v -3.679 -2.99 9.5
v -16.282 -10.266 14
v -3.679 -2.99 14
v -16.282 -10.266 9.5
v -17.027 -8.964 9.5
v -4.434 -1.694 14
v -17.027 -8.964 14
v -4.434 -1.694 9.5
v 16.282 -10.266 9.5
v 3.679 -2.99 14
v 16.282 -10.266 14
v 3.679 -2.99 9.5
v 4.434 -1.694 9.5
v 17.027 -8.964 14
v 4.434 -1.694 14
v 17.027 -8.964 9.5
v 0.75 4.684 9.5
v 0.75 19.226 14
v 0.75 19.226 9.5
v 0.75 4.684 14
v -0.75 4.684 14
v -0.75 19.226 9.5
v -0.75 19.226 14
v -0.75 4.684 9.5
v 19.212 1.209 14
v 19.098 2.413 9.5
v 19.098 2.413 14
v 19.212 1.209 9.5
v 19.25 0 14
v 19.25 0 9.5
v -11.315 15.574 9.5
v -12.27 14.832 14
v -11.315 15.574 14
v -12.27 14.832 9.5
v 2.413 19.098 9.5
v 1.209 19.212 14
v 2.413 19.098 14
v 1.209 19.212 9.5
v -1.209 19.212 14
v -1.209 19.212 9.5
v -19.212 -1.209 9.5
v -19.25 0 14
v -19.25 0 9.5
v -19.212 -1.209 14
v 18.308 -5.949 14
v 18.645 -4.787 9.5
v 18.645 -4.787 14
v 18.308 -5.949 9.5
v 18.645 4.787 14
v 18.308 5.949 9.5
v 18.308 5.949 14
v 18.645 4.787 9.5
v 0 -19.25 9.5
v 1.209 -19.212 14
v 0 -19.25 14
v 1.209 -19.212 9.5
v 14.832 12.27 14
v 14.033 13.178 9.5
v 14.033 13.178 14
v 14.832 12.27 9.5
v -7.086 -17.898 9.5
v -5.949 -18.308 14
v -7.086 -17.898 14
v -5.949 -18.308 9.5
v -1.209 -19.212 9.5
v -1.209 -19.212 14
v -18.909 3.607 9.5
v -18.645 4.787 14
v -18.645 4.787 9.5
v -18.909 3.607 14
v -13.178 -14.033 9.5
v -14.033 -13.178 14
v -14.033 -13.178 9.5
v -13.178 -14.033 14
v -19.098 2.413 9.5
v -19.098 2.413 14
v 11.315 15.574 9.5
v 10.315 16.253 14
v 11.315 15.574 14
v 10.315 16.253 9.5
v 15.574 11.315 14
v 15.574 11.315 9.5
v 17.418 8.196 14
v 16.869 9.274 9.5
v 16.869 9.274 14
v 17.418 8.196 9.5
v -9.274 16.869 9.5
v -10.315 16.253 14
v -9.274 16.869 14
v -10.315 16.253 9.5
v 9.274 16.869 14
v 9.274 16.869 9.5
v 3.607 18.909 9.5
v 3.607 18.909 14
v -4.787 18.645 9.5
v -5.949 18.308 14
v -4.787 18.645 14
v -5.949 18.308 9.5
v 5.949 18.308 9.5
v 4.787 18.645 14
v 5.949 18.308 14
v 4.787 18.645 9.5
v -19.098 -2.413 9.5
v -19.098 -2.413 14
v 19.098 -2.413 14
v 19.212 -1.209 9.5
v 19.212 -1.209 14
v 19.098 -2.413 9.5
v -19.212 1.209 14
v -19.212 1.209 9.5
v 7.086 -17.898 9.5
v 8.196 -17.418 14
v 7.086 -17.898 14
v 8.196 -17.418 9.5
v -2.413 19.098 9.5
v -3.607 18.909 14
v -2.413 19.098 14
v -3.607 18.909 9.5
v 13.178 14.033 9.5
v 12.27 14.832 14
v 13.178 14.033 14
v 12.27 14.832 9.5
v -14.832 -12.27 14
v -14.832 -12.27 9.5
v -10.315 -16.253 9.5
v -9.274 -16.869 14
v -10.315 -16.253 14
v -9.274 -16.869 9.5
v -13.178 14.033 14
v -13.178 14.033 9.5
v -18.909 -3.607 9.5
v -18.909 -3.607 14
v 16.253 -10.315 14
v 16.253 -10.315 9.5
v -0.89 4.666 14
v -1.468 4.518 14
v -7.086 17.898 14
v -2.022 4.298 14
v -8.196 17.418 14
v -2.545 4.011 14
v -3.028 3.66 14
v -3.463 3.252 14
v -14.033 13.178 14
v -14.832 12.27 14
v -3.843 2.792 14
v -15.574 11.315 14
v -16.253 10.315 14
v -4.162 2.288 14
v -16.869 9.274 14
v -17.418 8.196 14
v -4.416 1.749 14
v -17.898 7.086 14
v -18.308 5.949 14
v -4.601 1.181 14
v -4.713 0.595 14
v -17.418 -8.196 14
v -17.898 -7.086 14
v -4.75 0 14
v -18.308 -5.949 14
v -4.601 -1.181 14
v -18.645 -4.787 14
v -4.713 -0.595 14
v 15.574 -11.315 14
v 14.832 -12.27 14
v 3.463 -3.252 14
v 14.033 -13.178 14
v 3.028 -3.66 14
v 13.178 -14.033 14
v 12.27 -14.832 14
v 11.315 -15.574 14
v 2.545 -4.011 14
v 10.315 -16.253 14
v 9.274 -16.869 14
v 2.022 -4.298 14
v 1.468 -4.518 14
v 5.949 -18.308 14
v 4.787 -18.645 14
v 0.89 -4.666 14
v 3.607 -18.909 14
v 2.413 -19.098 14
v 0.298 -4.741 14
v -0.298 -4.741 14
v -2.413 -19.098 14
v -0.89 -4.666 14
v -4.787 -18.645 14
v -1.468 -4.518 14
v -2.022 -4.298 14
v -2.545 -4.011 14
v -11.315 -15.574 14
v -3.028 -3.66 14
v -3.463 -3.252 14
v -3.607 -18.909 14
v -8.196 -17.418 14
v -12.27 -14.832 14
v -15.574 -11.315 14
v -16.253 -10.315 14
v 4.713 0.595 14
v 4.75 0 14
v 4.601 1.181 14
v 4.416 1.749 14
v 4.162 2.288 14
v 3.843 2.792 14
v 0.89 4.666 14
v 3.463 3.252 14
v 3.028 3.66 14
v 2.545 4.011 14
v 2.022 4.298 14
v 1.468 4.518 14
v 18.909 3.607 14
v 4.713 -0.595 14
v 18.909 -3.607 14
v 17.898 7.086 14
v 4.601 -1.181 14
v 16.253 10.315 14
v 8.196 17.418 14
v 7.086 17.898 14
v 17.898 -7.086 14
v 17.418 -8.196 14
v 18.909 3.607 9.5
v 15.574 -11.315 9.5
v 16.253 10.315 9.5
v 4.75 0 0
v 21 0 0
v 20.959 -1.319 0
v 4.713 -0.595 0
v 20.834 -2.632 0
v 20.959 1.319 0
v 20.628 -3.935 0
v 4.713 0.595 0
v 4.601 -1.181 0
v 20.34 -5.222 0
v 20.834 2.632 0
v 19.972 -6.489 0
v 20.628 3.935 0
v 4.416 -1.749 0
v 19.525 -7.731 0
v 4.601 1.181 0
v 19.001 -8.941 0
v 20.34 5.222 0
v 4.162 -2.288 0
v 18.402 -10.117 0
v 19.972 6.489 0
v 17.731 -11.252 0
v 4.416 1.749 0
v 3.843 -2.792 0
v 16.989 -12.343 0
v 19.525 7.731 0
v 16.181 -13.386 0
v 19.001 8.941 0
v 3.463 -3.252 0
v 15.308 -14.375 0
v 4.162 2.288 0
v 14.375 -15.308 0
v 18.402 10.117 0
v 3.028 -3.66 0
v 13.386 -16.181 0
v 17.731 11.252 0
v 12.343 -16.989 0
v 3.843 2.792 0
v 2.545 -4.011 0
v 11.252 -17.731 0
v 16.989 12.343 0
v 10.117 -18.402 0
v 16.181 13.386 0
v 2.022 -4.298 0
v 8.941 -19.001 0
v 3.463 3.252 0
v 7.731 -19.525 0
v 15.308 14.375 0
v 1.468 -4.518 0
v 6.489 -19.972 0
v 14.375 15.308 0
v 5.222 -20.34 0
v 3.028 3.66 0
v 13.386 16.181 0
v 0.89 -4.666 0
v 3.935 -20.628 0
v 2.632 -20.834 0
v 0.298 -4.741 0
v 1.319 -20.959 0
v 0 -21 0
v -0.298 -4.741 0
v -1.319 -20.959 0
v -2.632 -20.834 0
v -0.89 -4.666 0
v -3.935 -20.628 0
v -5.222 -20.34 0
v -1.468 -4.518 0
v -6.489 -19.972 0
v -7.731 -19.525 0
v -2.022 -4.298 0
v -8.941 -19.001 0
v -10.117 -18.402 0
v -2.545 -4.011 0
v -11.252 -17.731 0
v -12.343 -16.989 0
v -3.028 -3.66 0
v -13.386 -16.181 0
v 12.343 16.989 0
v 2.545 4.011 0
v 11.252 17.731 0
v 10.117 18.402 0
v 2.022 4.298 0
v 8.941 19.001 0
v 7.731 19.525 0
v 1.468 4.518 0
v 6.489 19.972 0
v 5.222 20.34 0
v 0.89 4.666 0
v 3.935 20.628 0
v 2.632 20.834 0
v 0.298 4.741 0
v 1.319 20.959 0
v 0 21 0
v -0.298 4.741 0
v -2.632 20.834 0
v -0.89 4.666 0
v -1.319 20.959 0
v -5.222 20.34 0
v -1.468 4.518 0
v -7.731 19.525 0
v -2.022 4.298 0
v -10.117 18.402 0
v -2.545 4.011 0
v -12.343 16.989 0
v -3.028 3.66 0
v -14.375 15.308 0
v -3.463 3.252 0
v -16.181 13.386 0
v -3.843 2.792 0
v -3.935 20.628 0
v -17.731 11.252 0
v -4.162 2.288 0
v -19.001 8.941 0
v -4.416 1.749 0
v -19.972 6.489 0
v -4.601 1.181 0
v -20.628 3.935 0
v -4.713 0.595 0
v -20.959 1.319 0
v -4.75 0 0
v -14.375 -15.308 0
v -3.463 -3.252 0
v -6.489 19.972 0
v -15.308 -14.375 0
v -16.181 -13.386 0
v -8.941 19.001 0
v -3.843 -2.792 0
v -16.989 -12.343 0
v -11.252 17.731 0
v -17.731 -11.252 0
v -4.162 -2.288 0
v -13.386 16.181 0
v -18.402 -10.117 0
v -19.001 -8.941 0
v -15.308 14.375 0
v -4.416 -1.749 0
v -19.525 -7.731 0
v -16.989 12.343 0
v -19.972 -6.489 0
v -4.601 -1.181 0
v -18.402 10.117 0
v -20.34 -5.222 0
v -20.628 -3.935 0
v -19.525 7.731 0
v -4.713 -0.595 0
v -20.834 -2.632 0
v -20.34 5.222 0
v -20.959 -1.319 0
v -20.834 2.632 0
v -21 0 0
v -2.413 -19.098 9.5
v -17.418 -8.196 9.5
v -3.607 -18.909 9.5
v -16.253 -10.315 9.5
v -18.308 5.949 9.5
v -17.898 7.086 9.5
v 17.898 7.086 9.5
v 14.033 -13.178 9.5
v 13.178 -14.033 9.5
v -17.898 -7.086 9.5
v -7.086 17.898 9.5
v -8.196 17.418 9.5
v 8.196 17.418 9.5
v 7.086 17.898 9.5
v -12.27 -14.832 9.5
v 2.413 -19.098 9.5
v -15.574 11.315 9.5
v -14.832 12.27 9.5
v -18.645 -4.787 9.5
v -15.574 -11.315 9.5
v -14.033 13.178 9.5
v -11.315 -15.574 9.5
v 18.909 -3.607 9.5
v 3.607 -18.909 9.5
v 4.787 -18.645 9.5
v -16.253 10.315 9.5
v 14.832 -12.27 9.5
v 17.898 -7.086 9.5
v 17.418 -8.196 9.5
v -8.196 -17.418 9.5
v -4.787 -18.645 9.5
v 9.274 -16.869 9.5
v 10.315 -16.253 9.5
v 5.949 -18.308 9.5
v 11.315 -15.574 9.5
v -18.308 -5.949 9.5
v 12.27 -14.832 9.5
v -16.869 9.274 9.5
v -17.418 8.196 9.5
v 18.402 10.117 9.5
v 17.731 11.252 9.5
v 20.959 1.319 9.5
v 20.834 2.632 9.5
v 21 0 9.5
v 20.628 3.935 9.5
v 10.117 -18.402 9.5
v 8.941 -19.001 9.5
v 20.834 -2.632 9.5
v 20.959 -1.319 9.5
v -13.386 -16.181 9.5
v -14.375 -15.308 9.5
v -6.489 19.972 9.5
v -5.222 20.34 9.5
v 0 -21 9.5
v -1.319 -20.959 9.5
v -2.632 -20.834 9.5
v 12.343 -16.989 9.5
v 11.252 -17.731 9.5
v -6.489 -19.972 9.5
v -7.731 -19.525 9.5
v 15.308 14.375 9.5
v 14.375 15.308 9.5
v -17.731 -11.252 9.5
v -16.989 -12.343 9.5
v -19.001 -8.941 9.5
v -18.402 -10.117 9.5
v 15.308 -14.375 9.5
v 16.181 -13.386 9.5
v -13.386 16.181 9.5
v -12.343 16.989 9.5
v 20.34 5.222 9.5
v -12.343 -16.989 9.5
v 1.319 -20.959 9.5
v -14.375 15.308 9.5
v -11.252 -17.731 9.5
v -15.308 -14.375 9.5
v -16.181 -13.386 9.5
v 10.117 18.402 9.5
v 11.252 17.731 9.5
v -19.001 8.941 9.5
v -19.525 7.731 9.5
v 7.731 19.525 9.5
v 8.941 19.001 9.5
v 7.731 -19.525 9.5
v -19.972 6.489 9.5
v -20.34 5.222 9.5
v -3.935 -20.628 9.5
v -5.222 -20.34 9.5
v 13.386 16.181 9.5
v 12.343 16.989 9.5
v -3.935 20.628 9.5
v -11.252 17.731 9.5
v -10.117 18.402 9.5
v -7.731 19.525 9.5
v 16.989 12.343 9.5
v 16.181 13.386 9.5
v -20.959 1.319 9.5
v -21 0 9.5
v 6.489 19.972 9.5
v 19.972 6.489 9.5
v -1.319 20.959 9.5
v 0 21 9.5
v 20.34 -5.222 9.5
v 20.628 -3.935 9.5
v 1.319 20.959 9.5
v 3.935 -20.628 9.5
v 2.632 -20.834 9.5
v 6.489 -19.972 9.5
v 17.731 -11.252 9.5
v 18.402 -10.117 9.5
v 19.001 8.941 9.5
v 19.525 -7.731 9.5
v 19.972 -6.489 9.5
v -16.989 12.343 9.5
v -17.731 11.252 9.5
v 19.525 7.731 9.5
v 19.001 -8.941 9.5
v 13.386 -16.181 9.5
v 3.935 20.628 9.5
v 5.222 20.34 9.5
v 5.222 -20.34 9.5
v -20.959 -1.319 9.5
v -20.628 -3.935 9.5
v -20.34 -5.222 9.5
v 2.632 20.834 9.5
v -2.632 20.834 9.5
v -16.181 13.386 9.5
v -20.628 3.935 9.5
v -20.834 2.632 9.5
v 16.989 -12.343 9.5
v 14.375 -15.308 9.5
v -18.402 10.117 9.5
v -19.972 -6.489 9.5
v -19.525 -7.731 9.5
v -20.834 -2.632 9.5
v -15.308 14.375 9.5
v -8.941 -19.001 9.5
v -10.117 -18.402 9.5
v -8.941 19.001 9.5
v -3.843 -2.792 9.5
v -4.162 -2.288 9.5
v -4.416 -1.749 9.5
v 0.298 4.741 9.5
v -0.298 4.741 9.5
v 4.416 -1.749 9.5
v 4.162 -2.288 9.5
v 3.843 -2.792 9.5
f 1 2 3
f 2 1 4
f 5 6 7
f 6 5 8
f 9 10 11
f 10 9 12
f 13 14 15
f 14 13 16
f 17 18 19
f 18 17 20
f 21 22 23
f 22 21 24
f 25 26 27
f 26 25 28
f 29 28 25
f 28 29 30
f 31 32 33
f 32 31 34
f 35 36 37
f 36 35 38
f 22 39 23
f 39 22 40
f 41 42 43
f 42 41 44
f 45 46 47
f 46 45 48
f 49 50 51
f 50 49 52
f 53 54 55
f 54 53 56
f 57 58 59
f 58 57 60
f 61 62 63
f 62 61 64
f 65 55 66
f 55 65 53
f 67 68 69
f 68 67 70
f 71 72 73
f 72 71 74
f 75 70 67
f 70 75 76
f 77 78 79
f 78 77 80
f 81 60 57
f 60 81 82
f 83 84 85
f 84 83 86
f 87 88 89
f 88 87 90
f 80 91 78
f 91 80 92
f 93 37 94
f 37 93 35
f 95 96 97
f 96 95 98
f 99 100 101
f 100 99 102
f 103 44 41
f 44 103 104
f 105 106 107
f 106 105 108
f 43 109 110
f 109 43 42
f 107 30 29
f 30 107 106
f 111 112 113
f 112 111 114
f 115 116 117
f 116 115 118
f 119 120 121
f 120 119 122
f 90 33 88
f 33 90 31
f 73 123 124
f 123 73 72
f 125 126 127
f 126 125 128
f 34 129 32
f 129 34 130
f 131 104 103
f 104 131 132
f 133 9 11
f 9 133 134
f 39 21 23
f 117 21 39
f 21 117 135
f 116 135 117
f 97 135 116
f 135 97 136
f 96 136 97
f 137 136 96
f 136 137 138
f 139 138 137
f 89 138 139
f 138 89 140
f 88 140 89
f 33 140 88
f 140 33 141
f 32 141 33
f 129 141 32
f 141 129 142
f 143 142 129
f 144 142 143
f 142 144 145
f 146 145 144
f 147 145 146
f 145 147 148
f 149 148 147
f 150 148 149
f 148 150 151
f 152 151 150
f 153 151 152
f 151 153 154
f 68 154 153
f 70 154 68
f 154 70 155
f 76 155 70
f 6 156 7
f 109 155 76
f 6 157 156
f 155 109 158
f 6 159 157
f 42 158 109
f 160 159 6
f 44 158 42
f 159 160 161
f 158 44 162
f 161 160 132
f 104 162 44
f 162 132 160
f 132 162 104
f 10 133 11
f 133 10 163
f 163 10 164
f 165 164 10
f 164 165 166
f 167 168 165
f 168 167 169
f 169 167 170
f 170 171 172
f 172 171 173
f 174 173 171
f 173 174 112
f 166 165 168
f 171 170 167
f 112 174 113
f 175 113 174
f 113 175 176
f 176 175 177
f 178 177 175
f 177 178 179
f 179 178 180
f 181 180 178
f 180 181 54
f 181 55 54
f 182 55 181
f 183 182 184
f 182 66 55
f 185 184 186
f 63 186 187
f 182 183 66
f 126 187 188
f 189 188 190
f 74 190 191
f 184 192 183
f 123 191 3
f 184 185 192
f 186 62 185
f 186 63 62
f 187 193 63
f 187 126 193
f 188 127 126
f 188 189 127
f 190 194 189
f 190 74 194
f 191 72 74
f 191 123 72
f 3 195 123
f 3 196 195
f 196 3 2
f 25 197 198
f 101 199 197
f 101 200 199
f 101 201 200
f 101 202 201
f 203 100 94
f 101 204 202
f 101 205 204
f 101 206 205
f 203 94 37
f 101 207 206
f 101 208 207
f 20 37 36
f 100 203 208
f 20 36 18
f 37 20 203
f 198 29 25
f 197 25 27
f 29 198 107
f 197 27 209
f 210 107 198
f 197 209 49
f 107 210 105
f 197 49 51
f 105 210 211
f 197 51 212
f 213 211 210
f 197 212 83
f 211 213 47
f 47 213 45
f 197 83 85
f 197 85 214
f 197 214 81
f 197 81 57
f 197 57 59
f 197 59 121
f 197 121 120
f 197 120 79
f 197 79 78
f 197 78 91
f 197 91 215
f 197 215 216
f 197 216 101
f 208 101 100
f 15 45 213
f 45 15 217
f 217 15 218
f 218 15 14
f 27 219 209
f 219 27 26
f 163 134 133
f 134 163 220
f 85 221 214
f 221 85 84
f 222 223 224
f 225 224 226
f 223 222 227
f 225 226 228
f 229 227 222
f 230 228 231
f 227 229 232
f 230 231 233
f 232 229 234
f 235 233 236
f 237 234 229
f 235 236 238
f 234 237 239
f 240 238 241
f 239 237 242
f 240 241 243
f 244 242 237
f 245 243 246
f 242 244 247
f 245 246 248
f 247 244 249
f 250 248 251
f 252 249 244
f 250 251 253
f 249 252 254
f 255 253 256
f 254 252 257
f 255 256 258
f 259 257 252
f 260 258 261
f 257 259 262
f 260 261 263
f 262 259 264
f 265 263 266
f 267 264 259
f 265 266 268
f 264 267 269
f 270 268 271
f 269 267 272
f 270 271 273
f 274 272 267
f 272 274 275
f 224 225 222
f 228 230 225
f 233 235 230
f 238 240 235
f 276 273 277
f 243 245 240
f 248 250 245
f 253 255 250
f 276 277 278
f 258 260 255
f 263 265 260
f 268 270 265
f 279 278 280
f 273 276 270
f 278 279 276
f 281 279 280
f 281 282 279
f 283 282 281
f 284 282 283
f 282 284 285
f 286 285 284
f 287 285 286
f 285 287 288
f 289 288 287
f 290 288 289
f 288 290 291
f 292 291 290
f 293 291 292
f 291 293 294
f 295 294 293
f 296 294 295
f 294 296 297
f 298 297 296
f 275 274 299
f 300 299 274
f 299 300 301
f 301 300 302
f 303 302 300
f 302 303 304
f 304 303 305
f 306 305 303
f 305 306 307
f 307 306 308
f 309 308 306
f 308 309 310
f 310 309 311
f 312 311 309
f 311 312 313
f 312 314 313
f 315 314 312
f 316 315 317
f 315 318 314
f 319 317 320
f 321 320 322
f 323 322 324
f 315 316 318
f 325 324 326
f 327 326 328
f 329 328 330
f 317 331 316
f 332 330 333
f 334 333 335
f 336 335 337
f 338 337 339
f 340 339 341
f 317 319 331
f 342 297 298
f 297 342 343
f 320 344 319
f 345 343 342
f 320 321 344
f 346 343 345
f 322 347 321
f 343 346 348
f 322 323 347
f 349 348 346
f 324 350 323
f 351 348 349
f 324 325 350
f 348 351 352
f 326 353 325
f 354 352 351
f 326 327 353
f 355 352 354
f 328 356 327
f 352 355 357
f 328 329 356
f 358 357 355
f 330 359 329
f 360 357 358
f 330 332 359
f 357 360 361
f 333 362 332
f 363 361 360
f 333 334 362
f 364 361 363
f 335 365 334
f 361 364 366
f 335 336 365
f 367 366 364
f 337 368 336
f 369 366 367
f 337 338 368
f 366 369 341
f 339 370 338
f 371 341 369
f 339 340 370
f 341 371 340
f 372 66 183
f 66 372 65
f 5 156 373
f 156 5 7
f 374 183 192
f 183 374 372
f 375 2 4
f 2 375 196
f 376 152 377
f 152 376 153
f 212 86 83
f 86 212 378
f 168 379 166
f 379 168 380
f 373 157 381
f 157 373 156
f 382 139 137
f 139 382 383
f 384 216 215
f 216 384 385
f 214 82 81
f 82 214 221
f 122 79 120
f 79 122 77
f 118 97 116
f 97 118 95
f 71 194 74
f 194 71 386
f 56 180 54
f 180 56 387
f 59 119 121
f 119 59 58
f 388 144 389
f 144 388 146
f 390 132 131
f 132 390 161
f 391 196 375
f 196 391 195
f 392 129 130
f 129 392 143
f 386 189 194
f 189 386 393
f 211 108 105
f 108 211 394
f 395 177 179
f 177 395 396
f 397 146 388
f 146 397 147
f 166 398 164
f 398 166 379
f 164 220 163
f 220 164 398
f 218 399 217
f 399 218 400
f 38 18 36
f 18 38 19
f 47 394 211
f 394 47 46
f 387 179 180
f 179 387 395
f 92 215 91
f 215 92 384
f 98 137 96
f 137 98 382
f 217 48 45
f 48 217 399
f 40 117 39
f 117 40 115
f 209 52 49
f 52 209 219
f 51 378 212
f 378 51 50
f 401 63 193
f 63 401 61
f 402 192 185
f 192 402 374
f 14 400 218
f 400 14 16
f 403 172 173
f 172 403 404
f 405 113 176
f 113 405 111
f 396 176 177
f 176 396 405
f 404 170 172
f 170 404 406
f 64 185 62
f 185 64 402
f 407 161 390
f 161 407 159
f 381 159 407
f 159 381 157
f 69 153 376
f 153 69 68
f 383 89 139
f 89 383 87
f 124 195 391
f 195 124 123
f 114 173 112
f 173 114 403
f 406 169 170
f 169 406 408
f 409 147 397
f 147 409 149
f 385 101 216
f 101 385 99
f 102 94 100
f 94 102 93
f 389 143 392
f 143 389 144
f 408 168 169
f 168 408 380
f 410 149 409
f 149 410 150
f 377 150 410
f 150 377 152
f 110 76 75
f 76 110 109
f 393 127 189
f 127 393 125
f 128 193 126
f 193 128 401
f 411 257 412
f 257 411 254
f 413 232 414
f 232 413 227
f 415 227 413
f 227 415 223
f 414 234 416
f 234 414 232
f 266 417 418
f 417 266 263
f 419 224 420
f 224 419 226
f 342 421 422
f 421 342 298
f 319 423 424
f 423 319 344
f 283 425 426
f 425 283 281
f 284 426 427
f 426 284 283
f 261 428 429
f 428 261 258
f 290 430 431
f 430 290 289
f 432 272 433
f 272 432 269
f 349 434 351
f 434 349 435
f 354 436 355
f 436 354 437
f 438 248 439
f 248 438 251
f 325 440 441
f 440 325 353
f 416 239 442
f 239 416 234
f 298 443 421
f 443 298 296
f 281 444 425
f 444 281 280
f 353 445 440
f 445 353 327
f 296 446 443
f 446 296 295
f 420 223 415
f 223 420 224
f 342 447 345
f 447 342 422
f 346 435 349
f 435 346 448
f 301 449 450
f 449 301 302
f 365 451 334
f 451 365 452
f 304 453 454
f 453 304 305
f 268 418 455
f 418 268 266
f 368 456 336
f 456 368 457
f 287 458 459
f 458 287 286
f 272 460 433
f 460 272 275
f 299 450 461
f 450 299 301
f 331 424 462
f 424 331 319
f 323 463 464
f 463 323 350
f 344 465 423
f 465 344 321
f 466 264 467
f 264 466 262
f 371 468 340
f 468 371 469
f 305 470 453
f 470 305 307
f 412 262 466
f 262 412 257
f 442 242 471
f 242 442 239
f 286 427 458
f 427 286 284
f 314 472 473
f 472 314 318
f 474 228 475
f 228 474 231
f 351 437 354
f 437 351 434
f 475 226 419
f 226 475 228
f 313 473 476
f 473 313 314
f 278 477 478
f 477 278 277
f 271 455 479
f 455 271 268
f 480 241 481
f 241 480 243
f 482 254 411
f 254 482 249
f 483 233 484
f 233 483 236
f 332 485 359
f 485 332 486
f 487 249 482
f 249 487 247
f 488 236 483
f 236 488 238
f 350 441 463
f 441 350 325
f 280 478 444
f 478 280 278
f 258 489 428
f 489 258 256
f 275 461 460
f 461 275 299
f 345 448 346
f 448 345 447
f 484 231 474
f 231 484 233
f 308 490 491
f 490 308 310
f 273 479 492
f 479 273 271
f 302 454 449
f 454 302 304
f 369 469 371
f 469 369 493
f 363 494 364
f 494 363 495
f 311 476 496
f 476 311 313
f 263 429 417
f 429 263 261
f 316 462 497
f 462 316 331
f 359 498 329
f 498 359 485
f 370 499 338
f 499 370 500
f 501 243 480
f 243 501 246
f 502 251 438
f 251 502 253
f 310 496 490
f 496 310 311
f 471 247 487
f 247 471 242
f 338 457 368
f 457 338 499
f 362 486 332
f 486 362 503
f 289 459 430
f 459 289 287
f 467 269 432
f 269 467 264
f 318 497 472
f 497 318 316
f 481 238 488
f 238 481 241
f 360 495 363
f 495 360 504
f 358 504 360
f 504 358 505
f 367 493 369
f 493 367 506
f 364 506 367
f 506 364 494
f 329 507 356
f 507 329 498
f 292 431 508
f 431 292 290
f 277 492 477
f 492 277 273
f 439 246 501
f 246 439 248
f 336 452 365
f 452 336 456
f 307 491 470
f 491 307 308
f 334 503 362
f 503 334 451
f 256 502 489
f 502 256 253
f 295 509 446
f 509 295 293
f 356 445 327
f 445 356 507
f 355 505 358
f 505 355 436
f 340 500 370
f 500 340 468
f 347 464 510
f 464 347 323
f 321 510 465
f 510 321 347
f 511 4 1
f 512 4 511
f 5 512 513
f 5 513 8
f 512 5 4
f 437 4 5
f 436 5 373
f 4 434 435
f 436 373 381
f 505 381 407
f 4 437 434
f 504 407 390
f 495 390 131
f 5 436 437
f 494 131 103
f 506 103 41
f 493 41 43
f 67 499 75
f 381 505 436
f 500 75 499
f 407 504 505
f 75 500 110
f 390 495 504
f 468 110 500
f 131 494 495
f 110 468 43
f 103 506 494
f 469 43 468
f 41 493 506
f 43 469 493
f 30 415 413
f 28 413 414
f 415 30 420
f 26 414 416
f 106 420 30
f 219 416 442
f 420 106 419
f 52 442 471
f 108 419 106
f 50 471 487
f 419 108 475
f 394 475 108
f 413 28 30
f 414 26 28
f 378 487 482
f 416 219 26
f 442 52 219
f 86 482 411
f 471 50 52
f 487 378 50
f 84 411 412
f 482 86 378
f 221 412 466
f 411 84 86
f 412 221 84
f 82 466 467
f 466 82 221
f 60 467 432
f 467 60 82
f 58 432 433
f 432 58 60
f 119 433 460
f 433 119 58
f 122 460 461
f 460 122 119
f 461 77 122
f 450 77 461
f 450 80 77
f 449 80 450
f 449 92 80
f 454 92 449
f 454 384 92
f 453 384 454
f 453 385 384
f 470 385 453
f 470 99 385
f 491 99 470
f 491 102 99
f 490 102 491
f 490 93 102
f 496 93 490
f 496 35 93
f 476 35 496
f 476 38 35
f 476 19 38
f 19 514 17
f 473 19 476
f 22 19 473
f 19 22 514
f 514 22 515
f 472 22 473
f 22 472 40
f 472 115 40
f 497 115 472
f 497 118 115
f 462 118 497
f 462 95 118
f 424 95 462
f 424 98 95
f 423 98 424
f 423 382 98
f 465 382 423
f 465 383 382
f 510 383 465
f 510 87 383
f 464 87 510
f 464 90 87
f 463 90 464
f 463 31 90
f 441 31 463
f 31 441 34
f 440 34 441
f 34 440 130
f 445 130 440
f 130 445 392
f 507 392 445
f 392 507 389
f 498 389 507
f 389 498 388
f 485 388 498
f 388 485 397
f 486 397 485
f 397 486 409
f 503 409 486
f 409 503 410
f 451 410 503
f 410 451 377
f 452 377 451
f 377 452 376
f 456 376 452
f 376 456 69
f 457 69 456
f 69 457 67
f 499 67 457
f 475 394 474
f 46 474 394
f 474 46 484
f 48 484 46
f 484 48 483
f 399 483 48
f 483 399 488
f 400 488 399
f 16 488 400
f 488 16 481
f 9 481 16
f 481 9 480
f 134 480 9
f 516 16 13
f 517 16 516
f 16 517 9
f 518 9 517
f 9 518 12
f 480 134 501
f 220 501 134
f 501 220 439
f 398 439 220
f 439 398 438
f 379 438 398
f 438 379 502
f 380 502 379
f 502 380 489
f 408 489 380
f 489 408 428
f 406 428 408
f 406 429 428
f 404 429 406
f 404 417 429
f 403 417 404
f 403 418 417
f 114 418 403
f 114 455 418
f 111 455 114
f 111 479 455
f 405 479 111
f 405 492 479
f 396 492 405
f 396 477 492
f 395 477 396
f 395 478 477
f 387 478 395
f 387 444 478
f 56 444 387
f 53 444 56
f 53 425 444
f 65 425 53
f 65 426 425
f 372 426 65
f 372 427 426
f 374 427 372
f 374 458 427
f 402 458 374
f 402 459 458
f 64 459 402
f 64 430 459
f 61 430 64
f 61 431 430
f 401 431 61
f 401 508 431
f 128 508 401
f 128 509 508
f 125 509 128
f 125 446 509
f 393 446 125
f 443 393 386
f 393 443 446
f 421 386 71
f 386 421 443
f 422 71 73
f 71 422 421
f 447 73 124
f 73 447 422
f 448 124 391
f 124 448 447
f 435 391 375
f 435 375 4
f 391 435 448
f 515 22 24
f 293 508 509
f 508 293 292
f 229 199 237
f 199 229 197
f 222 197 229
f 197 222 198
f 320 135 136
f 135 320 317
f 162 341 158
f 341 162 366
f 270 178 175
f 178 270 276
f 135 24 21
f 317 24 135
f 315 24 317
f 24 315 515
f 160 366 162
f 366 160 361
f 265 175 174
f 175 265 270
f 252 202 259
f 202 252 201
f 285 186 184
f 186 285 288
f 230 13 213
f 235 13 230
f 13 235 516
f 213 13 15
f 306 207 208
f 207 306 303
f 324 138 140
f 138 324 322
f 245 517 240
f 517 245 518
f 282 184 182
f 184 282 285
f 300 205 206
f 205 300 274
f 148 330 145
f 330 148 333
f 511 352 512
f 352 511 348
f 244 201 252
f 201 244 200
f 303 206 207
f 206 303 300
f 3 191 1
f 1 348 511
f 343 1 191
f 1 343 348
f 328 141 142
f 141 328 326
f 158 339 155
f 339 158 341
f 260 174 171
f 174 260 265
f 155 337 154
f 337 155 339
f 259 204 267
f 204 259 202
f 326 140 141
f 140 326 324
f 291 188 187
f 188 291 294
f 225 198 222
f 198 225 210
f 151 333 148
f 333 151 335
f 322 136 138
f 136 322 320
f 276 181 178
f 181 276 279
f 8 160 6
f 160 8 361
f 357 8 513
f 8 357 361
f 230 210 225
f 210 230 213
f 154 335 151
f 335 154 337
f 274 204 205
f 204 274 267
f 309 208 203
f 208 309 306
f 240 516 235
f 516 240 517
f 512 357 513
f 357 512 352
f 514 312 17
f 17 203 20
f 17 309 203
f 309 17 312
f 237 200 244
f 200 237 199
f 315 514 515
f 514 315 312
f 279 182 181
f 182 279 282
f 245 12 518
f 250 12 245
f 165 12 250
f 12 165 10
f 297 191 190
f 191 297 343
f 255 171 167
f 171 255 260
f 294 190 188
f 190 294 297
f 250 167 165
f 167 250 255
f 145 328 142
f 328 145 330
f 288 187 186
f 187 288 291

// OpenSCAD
external_d=42;
internal_d=38.5;
total_h=14;
fill_h=4.5;
separator_h=total_h-fill_h;
inner_axis_d=9.5;
fin_w=1.5;
fin_n=3;

difference() {
  union() {
    difference() {
      cylinder(d=internal_d,h=separator_h+fill_h,$fn=100);
      for(i=[1:fin_n]) {
        rotate([0,0,i*360/fin_n]) {
          translate([0,internal_d/4,0]) {
            cube([fin_w,internal_d/2+1,2*total_h+1],center=true);
          }
        }
      }
    }
    cylinder(d=external_d,h=separator_h,$fn=100);
  }
  translate([0,0,-1]) {
    cylinder(d=inner_axis_d,h=separator_h+fill_h+2,$fn=50);
  }
}
